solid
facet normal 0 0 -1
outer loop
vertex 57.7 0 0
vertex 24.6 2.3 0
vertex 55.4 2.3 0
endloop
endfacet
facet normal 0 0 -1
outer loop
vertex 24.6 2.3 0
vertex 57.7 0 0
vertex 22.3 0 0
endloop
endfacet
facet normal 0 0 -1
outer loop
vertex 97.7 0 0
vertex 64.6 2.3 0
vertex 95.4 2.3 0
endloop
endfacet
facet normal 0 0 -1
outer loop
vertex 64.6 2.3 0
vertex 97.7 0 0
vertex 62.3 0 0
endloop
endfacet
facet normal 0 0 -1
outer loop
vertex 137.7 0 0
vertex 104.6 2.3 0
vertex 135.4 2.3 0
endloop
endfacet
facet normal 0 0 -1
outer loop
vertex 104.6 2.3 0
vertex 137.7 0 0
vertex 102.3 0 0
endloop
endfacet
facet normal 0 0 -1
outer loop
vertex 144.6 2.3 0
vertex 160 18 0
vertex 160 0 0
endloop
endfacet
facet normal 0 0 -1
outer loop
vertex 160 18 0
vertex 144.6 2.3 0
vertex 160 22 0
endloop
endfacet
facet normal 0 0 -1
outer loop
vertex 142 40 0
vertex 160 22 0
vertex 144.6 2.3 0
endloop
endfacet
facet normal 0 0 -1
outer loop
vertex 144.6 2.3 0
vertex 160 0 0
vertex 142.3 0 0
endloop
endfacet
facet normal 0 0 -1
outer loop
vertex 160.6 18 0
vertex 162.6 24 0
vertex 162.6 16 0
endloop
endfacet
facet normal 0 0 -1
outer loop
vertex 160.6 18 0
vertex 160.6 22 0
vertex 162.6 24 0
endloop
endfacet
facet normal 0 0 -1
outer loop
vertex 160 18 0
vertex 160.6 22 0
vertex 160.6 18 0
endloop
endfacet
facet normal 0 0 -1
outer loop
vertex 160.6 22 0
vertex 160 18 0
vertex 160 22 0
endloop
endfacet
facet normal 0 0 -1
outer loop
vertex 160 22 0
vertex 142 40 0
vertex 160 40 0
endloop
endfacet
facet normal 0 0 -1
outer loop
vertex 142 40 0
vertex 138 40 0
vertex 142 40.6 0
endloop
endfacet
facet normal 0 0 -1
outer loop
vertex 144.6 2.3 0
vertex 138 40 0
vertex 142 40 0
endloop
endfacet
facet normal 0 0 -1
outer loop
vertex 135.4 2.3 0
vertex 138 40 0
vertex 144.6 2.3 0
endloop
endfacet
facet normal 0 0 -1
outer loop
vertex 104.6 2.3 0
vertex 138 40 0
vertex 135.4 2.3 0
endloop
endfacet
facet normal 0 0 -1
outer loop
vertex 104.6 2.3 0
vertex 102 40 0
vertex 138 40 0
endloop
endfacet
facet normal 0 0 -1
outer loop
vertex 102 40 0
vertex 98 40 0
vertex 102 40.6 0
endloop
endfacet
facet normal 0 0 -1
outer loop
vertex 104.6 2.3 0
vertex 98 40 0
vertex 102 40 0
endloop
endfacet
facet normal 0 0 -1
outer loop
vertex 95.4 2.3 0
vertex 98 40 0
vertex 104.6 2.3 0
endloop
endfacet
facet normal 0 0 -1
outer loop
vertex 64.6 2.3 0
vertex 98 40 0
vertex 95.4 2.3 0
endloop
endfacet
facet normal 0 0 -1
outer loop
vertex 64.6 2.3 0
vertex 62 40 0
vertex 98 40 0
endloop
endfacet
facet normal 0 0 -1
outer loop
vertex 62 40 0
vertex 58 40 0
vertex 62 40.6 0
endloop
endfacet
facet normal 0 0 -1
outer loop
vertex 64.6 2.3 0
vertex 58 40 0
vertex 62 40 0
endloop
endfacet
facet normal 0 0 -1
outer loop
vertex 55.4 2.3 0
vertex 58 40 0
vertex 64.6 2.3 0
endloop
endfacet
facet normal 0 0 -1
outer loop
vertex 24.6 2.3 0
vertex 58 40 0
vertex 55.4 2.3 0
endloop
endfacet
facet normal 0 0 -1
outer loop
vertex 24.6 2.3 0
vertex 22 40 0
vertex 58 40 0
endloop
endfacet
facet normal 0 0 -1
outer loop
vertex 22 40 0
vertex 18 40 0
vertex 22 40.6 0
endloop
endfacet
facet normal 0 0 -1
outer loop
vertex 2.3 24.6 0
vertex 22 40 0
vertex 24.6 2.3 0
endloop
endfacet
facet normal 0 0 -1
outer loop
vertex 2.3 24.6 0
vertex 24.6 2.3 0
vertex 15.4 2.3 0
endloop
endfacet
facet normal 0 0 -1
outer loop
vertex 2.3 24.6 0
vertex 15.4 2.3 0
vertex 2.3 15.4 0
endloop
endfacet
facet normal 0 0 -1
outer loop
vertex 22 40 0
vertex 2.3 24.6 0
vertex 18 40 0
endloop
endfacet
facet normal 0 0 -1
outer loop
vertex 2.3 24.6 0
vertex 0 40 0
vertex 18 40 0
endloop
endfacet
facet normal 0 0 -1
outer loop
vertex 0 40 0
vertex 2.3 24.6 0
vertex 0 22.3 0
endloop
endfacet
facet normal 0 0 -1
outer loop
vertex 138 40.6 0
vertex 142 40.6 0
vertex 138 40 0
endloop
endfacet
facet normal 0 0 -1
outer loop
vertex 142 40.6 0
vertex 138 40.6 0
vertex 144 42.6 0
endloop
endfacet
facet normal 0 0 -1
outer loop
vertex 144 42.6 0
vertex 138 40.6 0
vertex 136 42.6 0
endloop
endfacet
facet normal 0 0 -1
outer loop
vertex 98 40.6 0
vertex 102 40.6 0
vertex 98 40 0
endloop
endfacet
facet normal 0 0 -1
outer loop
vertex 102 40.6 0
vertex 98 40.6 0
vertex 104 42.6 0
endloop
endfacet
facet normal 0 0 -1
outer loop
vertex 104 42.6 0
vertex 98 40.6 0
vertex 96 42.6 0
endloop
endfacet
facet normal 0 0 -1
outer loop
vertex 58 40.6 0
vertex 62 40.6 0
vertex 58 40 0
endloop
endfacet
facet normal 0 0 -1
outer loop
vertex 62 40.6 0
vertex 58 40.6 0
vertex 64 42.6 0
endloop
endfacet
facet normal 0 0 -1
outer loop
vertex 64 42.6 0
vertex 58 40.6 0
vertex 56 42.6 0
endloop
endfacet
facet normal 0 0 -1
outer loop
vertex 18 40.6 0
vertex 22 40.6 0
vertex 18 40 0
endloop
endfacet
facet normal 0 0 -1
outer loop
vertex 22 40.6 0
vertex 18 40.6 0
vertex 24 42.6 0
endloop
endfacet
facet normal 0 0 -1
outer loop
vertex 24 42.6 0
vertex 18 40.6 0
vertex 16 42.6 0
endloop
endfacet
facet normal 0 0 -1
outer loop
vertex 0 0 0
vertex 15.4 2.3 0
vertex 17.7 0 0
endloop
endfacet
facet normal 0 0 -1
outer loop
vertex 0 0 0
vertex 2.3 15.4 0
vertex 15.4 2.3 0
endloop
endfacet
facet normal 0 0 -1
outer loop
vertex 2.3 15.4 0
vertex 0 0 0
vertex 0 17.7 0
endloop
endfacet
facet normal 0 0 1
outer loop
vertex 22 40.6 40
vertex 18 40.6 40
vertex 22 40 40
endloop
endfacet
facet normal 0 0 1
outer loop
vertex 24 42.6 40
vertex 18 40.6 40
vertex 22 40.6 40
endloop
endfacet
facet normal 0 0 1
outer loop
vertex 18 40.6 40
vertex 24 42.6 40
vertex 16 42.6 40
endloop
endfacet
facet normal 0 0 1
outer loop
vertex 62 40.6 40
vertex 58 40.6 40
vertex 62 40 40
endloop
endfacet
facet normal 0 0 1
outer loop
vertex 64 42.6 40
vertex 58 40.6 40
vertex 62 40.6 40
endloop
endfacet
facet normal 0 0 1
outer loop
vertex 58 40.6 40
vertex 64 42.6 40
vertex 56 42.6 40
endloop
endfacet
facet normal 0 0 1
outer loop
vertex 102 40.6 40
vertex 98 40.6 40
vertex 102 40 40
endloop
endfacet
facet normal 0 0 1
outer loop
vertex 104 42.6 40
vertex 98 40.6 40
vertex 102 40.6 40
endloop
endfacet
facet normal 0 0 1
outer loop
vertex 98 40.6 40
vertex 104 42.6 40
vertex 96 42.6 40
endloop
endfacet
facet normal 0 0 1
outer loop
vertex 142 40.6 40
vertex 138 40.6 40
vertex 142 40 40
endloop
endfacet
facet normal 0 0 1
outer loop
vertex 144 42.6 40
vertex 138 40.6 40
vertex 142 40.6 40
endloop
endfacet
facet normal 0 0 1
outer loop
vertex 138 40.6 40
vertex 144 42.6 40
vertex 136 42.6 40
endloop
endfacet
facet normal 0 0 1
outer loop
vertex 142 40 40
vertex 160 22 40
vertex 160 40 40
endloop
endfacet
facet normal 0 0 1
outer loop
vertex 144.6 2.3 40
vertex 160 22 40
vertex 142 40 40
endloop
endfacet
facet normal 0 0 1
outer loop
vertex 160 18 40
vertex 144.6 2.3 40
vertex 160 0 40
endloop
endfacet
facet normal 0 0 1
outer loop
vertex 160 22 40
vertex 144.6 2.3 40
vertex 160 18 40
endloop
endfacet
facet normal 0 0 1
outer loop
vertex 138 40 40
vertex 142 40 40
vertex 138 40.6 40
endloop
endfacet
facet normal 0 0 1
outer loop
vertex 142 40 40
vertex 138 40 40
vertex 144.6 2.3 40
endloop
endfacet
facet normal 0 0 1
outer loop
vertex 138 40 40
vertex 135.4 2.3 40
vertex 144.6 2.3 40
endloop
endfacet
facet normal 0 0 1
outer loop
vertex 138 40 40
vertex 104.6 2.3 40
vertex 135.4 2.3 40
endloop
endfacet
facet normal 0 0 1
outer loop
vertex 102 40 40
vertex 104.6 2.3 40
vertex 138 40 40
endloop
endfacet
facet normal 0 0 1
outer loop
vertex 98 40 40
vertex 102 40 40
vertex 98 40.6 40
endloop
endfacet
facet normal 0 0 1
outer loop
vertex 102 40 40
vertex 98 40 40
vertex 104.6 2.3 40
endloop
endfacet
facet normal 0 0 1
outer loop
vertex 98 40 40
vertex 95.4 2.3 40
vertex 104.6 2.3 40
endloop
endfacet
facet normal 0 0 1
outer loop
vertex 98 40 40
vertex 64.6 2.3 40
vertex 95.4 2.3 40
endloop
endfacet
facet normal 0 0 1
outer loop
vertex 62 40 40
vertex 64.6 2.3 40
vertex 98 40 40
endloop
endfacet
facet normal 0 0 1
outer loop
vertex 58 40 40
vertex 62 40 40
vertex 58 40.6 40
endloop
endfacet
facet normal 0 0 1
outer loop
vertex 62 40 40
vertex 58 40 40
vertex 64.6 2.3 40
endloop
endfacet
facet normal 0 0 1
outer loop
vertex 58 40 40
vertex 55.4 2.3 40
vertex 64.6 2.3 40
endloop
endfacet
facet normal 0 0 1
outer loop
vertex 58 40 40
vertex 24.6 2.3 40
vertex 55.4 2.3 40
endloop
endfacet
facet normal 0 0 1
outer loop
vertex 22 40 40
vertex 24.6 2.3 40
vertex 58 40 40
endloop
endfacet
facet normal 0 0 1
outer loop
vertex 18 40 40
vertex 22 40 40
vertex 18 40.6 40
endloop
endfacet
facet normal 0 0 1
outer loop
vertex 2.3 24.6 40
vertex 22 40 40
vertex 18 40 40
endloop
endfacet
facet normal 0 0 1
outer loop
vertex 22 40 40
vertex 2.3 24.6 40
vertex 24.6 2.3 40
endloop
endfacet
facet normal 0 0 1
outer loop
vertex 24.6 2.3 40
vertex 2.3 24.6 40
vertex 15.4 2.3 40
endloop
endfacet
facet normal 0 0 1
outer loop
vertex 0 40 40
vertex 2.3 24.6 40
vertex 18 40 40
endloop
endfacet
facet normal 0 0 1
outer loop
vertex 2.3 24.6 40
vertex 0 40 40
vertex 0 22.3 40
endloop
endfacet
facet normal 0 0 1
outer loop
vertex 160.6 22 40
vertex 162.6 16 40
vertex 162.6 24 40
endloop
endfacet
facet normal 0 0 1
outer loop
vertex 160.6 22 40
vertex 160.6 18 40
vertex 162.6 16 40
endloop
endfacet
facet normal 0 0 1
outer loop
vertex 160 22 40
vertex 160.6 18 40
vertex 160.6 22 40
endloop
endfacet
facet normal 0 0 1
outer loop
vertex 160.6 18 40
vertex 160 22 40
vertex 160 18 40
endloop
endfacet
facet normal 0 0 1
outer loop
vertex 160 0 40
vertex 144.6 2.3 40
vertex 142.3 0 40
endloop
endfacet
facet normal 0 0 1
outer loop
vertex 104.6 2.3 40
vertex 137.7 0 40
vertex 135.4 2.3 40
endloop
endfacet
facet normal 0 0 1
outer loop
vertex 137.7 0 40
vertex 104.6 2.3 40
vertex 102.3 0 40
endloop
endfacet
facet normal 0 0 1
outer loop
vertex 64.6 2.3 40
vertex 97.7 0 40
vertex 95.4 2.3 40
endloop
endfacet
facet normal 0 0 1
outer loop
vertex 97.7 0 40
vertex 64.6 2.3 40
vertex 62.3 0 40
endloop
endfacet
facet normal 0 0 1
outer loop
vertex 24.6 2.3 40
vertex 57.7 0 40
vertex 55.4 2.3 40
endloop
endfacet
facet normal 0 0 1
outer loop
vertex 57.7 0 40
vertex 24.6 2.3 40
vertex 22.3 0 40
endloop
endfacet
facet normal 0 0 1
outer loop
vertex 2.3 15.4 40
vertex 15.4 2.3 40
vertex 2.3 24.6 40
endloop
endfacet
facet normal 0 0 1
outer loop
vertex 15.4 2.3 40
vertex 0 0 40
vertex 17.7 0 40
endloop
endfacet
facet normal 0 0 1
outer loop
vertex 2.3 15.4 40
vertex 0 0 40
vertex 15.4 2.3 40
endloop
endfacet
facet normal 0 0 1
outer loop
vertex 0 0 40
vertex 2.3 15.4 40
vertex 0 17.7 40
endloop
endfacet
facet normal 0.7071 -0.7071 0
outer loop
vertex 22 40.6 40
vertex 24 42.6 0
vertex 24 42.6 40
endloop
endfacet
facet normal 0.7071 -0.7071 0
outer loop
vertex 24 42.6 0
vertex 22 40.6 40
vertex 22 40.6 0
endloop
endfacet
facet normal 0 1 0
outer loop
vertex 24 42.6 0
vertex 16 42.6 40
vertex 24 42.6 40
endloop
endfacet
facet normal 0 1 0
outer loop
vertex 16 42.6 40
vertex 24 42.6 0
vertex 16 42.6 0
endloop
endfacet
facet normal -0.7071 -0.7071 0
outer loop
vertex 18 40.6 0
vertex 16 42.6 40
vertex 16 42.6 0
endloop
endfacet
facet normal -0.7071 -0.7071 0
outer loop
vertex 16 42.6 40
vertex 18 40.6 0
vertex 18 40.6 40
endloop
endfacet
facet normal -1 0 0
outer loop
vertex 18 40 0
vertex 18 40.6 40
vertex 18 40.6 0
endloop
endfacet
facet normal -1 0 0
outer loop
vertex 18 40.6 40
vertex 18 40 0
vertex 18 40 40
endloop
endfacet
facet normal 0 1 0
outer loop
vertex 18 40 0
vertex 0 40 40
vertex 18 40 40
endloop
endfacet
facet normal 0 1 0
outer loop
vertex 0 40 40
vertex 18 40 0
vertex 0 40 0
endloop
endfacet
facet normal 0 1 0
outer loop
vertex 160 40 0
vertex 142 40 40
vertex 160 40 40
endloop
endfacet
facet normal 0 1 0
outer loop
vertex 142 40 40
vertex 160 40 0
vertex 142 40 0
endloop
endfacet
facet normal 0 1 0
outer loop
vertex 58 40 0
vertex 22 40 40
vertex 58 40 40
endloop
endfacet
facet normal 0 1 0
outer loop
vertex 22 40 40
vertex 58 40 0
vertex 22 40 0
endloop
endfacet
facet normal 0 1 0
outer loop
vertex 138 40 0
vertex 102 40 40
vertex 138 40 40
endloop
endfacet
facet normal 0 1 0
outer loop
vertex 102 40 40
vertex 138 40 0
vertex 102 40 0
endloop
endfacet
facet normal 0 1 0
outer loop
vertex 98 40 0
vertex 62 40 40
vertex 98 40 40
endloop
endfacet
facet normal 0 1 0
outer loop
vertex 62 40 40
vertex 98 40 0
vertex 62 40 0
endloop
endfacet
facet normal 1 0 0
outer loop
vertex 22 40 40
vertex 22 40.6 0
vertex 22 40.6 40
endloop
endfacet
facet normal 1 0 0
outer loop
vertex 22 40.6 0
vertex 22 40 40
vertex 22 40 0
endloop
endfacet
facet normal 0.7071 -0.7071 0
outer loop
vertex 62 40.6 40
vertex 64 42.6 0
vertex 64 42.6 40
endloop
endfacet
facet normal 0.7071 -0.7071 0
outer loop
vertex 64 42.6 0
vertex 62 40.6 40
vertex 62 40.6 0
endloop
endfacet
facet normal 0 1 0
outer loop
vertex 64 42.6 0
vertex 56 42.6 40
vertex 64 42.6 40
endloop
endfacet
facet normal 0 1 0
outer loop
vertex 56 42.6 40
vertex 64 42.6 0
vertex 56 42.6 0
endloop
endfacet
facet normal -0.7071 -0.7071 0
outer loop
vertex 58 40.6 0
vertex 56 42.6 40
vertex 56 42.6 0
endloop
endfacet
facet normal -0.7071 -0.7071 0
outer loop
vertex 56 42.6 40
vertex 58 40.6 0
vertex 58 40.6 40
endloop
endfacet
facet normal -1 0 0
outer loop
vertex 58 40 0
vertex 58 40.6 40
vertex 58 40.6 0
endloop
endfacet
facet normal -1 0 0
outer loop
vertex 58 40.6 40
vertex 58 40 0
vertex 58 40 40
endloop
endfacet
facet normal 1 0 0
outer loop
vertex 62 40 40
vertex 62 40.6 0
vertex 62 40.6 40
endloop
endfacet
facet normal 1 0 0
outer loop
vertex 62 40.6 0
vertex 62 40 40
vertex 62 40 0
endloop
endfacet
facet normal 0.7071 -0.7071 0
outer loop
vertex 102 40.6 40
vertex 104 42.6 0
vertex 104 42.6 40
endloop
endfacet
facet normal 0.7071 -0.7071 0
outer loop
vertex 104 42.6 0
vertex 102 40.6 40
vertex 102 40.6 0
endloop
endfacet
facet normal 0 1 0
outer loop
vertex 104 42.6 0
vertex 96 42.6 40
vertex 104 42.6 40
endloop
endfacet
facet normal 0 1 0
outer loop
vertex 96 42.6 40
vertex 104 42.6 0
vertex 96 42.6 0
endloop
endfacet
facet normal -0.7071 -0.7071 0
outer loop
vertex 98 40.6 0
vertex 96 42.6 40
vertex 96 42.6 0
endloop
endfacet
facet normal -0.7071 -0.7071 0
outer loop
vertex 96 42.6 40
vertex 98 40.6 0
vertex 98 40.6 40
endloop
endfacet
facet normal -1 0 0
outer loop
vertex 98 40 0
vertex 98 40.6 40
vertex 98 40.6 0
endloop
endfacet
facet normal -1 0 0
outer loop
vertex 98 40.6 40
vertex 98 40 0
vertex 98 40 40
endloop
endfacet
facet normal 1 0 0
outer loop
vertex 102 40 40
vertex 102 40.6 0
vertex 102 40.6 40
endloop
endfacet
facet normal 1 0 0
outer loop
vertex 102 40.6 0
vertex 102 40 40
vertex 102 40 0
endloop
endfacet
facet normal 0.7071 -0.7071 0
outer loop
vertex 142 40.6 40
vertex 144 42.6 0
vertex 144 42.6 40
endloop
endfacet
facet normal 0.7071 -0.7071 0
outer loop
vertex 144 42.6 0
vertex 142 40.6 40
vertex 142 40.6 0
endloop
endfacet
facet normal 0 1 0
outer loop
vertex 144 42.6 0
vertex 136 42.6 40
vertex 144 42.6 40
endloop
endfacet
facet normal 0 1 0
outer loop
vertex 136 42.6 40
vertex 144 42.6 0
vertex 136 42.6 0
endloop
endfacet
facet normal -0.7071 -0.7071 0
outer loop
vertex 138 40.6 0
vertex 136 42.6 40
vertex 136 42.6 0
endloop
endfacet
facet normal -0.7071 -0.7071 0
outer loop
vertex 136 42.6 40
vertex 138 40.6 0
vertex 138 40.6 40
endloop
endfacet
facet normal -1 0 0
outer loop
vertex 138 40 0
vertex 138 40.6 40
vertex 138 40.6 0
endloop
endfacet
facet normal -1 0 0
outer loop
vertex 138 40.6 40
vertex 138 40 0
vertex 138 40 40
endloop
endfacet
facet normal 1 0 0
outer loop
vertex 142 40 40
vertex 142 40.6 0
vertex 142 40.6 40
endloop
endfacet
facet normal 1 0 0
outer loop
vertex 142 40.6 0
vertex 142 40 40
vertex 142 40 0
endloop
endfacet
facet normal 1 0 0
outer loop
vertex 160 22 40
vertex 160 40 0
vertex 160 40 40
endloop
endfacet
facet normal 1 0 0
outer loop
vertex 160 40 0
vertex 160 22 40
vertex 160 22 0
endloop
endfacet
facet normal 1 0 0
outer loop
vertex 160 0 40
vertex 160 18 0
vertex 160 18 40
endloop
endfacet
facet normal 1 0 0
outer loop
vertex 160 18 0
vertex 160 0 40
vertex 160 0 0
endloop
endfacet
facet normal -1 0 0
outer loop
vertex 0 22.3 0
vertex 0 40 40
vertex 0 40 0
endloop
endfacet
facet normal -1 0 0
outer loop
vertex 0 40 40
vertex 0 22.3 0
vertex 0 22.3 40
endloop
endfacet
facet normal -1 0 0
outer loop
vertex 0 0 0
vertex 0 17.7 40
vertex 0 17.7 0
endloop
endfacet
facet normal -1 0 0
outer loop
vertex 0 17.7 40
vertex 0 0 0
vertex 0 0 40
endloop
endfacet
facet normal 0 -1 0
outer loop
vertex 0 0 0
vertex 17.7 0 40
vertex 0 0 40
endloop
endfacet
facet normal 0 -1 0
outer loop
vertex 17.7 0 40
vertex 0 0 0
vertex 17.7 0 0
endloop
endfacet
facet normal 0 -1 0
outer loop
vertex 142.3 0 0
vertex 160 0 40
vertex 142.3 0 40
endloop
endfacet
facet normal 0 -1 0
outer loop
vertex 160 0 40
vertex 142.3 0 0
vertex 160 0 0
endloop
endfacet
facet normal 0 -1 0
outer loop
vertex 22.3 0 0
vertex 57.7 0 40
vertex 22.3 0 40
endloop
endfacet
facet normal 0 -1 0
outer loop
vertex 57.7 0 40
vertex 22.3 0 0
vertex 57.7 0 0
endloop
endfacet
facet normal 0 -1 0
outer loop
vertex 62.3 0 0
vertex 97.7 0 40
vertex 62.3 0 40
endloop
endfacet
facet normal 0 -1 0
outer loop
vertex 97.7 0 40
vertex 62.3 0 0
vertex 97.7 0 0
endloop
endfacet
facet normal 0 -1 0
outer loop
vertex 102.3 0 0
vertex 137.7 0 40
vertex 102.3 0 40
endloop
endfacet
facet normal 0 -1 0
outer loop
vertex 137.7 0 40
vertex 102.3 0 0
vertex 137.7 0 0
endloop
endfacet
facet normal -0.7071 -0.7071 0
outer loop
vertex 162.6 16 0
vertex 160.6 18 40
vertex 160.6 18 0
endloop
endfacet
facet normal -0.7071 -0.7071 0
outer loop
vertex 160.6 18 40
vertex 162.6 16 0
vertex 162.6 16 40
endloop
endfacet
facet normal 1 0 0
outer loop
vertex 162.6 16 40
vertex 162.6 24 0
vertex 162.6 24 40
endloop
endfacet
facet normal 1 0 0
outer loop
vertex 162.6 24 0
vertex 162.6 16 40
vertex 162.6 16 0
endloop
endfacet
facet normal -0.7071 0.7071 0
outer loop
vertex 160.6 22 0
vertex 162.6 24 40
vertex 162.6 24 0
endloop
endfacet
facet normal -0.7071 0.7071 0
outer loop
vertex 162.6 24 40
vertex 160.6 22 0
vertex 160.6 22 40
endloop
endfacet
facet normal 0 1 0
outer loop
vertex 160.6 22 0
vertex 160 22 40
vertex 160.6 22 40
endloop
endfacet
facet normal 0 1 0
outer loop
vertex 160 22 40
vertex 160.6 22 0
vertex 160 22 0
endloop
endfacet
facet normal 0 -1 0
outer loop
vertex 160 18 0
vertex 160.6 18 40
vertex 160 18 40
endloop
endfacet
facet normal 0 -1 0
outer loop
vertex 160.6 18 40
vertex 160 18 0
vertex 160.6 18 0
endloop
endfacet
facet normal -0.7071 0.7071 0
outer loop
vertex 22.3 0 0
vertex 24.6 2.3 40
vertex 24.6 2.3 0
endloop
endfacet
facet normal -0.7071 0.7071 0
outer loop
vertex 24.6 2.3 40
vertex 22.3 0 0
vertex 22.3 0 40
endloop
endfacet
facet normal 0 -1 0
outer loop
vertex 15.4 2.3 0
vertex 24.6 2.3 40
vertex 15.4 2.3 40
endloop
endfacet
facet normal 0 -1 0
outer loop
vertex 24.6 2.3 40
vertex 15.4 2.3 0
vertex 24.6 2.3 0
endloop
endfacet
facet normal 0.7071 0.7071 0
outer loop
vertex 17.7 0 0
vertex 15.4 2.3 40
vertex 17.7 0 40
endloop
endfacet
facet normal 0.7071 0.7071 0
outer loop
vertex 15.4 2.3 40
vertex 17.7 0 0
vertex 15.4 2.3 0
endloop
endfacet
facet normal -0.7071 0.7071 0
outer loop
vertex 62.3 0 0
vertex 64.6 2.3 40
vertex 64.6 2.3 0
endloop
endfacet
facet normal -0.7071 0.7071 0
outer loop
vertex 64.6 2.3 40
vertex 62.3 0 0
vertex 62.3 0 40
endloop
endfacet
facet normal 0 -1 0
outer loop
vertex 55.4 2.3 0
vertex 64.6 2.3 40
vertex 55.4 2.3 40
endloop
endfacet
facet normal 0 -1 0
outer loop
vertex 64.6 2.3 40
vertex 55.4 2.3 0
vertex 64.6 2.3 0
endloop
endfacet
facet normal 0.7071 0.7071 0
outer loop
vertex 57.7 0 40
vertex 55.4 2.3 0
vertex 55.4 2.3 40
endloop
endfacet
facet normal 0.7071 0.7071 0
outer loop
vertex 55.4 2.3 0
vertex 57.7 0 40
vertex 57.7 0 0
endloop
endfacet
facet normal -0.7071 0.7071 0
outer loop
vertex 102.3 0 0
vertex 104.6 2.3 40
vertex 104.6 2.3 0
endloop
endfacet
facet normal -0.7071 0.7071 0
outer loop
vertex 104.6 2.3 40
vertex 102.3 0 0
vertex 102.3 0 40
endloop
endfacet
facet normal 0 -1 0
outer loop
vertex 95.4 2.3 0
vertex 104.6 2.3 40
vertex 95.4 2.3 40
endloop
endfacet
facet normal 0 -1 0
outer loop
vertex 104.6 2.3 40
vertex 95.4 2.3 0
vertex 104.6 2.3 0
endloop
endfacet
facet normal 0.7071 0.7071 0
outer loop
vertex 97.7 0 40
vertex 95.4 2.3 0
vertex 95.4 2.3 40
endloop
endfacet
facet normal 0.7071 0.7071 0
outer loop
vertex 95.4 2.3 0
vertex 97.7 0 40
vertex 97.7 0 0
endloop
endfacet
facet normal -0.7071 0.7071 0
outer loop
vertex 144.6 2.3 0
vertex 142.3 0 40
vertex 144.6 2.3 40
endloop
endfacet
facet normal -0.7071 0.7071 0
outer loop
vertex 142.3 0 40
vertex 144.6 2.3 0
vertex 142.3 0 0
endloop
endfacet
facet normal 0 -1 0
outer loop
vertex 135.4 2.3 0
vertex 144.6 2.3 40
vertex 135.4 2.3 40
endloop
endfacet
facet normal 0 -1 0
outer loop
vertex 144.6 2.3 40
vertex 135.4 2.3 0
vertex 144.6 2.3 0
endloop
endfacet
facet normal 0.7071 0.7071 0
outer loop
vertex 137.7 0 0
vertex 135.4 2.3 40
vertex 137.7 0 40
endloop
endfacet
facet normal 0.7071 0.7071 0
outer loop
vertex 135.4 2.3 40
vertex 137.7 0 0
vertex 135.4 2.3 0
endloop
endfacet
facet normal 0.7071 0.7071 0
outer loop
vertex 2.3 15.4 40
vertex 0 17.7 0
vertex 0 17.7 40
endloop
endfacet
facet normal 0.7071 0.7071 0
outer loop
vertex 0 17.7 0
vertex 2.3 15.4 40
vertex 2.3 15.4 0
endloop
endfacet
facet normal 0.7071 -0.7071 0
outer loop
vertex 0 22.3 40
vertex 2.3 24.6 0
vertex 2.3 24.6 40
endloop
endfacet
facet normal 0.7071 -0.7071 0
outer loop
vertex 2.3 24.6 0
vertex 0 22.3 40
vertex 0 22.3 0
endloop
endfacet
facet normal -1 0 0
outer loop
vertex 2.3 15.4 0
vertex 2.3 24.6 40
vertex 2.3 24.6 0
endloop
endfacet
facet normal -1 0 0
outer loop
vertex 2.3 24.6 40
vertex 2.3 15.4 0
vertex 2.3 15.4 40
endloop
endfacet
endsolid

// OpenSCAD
/* [Size] */
// Box unit size in mm. This defines the size of 1 'unit' for your box.
BoxUnits = 40;
// Box Width in units
BoxWidthUnits = 1;
BoxWidth = BoxWidthUnits * BoxUnits;
// Box Length in units
BoxLengthUnits = 4;
BoxLength = BoxLengthUnits * BoxUnits;
// Box Height in mm
BoxHeight = 40;
// Fit Factor. Greater factor = looser fit
FitFactor = 0.15; // [0:0.01:0.4]

/* [Dovetail] */
// Dovetail inside length in mm
DTInsideLength = 4; // [1:0.2:5]
// Dovetail angle in degrees
DTAngle = 45;
// Dovetail width in mm
DTWidth = 2; // [1:0.2:4]

/* [Hidden] */
// This helps calculate the length of the 'long' side of the dovetail
DTx = tan(DTAngle) * DTWidth;
// This polygon defines the dovetail shape
DTShape = [
    [ 0, 0 ],
    [ DTInsideLength / 2, 0 ],
    [ DTInsideLength / 2 + DTx, DTWidth ],
    [ -DTInsideLength / 2 - DTx, DTWidth ],
    [ -DTInsideLength / 2, 0 ]
];

difference()
{
    union()
    {
        // main box
        cube([ BoxLength, BoxWidth, BoxHeight ], center = false);

        // -- Male dovetails
        for (i = [1:BoxLengthUnits])
            translate(
                [ (i - 1) * BoxUnits + (BoxUnits / 2), BoxWidth, 0 ])
                union()
            {
                linear_extrude(height = BoxHeight, center = false) union()
                {
                    // this adds a slight offset to the male dovetail for a
                    // looser fit
                    translate([ -DTInsideLength / 2, 0, 0 ])
                        square([ DTInsideLength, DTWidth ]);
                    // main dovetail shape
                    translate([ 0, DTWidth * FitFactor * 2, 0 ])
                        polygon(DTShape);
                };
            }
        for (i = [1:BoxWidthUnits])
            translate([ BoxLength, (i - 1) * BoxUnits + (BoxUnits / 2), 0 ])
                rotate([ 0, 0, -90 ])
                    linear_extrude(height = BoxHeight, center = false) union()
            {
                // male dovetail offset
                translate([ -DTInsideLength / 2, 0, 0 ])
                    square([ DTInsideLength, DTWidth ]);
                // main dovetail shape
                translate([ 0, DTWidth * FitFactor * 2, 0 ]) polygon(DTShape);
            };
    }

    // --- Female dovetails
    for (i = [1:BoxLengthUnits])
        union()
        {
            translate([ (i - 1) * BoxUnits + (BoxUnits / 2), 0, 0 ])
                scale([ 1 + FitFactor, 1 + FitFactor, 1 ])
                    linear_extrude(height = BoxHeight, center = false)
                        polygon(DTShape);
        }
        for (i = [1:BoxWidthUnits])
            translate([ 0, (i - 1) * BoxUnits + (BoxUnits / 2), 0 ])
                rotate([ 0, 0, -90 ]) scale([ 1 + FitFactor, 1 + FitFactor, 1 ])
                    linear_extrude(height = BoxHeight, center = false)
                        polygon(DTShape);
} // difference
